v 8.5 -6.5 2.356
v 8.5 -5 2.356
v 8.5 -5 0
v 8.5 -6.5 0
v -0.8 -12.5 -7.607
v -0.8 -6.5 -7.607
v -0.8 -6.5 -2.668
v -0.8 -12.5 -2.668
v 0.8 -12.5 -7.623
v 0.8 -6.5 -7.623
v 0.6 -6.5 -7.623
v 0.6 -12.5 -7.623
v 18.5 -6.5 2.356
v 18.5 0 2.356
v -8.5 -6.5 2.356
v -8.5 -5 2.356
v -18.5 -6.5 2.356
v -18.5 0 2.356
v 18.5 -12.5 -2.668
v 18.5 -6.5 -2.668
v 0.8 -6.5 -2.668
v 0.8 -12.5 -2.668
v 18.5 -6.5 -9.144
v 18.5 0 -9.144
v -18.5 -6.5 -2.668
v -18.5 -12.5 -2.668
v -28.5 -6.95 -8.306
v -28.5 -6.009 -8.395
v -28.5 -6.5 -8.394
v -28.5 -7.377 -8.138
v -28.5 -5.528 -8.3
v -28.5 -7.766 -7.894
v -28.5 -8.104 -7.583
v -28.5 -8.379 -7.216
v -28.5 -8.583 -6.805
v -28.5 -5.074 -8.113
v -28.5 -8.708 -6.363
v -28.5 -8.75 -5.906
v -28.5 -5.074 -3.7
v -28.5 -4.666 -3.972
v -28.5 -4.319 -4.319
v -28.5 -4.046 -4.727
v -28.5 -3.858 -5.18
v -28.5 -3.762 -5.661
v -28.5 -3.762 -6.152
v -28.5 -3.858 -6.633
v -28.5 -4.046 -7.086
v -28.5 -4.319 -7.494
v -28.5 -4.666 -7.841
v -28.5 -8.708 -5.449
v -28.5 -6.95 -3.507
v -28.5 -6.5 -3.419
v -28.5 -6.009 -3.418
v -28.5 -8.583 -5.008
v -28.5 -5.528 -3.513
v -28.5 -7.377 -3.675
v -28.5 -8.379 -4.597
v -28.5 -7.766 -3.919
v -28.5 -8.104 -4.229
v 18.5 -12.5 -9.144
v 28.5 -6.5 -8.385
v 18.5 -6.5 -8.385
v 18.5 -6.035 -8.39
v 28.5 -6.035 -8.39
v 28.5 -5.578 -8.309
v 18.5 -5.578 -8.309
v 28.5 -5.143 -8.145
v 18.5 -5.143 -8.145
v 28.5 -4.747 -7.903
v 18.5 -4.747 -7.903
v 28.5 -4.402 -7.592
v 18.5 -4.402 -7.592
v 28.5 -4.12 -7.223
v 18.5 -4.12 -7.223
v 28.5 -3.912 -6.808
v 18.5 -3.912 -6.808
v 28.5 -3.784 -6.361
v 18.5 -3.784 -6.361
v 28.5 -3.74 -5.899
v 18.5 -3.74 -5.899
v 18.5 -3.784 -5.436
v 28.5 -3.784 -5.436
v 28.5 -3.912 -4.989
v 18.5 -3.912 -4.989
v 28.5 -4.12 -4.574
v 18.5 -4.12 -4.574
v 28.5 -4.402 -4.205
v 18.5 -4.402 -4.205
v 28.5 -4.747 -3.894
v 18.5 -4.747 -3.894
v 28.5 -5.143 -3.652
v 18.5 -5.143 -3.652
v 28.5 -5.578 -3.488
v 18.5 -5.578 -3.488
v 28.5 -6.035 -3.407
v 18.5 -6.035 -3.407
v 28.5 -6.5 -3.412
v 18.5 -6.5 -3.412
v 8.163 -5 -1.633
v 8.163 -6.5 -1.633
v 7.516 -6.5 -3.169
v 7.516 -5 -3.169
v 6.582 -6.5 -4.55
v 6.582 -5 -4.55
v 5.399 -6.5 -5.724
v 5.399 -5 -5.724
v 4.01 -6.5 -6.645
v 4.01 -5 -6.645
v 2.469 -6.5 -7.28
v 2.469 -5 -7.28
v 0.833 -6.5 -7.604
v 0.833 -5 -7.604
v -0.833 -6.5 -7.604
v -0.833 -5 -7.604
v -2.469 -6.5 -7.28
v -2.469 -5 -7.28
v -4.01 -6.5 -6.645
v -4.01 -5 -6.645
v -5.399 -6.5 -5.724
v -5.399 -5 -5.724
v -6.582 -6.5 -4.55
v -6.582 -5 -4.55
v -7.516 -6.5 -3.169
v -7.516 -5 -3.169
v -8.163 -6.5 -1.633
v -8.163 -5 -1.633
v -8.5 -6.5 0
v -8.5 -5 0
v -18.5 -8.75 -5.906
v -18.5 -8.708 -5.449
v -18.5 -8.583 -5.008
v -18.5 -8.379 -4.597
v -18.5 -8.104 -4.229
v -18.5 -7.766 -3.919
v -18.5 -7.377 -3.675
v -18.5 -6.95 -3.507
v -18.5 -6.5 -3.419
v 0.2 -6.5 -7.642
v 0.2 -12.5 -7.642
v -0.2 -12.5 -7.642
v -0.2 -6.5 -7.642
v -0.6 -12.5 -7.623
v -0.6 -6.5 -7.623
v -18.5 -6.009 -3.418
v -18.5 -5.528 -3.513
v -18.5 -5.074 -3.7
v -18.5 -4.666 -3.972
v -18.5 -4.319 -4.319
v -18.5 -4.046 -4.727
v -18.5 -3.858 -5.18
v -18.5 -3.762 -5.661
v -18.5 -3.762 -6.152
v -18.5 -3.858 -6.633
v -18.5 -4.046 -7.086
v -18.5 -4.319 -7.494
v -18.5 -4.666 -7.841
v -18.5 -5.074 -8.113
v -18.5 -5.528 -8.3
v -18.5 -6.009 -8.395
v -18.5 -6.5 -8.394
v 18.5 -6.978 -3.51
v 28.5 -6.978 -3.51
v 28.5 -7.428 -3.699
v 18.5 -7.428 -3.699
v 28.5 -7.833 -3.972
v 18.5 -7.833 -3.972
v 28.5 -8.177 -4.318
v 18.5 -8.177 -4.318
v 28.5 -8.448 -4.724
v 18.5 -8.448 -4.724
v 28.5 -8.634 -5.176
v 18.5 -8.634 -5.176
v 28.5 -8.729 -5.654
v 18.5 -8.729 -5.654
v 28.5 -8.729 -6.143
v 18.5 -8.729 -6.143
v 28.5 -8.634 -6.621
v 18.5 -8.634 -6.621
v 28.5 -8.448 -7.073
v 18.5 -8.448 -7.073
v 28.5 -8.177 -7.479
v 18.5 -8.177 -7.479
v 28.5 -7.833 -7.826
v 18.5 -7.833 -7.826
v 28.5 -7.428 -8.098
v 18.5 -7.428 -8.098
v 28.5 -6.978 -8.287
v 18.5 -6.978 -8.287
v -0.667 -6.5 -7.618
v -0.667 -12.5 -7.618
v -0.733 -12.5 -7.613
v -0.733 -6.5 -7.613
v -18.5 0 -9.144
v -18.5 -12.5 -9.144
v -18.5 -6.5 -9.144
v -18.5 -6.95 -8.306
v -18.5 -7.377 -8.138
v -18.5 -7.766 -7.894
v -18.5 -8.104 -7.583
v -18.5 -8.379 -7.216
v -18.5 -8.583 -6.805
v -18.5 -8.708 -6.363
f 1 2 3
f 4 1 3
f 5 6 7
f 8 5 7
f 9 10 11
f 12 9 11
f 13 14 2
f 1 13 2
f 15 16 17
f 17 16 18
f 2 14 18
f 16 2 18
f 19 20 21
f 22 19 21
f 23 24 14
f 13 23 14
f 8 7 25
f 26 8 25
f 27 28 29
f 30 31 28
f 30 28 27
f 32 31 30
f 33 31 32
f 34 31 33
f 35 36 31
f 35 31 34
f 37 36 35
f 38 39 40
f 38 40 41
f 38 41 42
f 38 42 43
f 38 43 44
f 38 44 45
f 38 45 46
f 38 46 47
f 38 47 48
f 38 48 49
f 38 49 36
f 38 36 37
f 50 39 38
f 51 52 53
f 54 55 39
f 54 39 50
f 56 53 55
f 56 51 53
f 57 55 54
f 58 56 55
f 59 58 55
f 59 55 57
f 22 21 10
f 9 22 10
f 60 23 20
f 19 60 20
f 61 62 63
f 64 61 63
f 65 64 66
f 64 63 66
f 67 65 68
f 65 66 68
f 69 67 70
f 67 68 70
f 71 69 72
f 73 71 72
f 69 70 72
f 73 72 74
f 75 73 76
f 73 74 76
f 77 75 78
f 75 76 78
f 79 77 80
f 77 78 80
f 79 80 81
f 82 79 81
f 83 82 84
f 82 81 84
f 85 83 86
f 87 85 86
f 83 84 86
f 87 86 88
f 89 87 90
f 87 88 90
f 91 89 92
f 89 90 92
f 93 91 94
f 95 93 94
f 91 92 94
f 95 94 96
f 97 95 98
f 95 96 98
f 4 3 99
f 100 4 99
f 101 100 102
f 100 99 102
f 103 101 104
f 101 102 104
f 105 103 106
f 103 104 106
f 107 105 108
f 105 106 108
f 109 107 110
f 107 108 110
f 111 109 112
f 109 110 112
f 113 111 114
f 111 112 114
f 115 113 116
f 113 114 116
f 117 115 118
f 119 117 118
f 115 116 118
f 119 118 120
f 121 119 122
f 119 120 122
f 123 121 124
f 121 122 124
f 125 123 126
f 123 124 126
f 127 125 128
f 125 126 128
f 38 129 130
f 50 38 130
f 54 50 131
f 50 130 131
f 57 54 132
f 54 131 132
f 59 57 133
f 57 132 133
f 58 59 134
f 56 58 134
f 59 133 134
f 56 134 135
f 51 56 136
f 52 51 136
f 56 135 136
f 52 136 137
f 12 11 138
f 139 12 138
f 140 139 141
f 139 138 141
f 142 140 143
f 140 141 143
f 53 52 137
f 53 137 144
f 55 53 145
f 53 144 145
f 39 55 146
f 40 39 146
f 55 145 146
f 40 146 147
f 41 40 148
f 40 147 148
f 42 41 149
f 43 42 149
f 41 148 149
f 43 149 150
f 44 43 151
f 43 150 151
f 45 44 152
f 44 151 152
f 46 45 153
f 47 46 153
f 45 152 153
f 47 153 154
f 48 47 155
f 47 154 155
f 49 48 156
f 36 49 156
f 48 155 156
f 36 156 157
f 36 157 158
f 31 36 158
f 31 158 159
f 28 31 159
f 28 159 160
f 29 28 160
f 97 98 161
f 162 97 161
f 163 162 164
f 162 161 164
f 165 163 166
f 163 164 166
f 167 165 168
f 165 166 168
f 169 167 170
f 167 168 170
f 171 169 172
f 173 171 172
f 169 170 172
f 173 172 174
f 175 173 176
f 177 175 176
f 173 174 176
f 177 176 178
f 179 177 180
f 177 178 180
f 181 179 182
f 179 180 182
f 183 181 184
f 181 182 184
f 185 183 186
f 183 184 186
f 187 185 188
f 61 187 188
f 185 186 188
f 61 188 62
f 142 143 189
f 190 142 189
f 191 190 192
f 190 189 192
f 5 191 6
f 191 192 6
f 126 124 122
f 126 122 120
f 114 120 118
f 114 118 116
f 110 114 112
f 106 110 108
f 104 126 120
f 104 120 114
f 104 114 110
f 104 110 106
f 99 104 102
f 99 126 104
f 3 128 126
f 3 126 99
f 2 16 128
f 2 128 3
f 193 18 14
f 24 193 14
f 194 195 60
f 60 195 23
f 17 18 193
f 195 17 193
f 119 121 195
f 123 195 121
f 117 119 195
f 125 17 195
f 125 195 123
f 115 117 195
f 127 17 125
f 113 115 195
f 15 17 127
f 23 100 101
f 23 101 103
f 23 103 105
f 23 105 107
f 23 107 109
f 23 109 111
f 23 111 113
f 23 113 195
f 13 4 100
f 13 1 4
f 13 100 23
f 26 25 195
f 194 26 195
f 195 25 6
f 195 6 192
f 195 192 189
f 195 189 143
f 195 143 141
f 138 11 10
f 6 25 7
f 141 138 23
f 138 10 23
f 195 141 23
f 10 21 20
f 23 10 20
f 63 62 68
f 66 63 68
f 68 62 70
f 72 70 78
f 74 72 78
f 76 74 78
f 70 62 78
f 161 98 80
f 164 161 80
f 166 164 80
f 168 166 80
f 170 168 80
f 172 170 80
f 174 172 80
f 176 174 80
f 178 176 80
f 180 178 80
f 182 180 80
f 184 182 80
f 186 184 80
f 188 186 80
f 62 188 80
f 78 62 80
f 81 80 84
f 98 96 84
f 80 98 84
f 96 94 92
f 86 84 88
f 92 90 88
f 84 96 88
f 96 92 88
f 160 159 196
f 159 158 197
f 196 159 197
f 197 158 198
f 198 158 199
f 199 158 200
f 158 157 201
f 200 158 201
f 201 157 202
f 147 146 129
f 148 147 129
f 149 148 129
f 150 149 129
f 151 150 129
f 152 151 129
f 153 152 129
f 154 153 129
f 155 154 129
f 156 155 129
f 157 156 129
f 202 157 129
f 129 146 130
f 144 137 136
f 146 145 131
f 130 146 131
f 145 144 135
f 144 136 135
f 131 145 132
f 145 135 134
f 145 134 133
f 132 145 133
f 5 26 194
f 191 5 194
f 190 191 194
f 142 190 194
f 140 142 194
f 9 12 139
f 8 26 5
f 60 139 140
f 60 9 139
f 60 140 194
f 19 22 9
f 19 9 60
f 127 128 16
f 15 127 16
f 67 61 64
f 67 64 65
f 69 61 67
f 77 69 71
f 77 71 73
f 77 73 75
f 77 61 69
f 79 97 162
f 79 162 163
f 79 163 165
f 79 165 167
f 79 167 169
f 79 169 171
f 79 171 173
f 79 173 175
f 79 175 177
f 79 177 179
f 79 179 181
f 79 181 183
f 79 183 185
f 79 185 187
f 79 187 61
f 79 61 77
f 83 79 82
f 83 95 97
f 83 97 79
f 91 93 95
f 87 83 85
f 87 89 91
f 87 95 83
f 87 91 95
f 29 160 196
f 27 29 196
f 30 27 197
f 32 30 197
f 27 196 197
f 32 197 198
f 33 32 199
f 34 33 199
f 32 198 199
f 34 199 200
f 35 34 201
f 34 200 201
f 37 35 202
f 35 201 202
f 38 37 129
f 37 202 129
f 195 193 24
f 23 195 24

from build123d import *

# Parameters (mm, degrees)
F1_DEPTH = 5
F2_DEPTH = 6.5
F4_DEPTH = 6
F6_DEPTH = 10
F8_DEPTH = 10


with BuildPart() as f1:
    # F0 (on Front) → F1 (new body)
    with BuildSketch(Plane.XZ):
        with BuildLine():
            Line((-8.5, 2.3556), (-8.5, 0))
            ThreePointArc((-8.5, 0), (0, -7.6444), (8.5, 0))
            Line((8.5, 0), (8.5, 2.3556))
            Line((8.5, 2.3556), (-8.5, 2.3556))
        make_face()
    extrude(amount=F1_DEPTH)

    # F0 (on Front) → F2 (join)
    with BuildSketch(Plane.XZ):
        with BuildLine():
            ThreePointArc((8.5, 0), (0, -7.6444), (-8.5, 0))
            Line((-8.5, 0), (-8.5, 2.3556))
            Line((-8.5, 2.3556), (-18.5, 2.3556))
            Line((-18.5, 2.3556), (-18.5, -9.1444))
            Line((-18.5, -9.1444), (18.5, -9.1444))
            Line((18.5, -9.1444), (18.5, 2.3556))
            Line((18.5, 2.3556), (8.5, 2.3556))
            Line((8.5, 2.3556), (8.5, 0))
        make_face()
    extrude(amount=F2_DEPTH)


with BuildPart() as f4:
    # F3 (on face) → F4 (new body)
    with BuildSketch(Plane.XZ.offset(6.5)):
        with BuildLine():
            Line((-7.765819, -2.6684), (-18.5, -2.6684))
            Line((-18.5, -2.6684), (-18.5, -9.1444))
            Line((-18.5, -9.1444), (18.5, -9.1444))
            Line((18.5, -9.1444), (18.5, -2.6684))
            Line((18.5, -2.6684), (7.765819, -2.6684))
            ThreePointArc((7.765819, -2.6684), (4.94373, -6.06974), (0.8, -7.606881))
            Line((0.8, -7.606881), (0.8, -7.623304))
            Line((0.8, -7.623304), (0.600173, -7.623304))
            ThreePointArc((0.600173, -7.623304), (0, -7.6444), (-0.600173, -7.623304))
            ThreePointArc((-0.600173, -7.623304), (-0.700135, -7.615679), (-0.8, -7.606881))
            ThreePointArc((-0.8, -7.606881), (-4.94373, -6.06974), (-7.765819, -2.6684))
        make_face()
        with BuildLine():
            Line((-0.8, -2.6684), (-7.765819, -2.6684))
            ThreePointArc((-7.765819, -2.6684), (-4.94373, -6.06974), (-0.8, -7.606881))
            Line((-0.8, -7.606881), (-0.8, -2.6684))
        make_face()
        with BuildLine():
            ThreePointArc((0.8, -7.606881), (4.94373, -6.06974), (7.765819, -2.6684))
            Line((7.765819, -2.6684), (0.8, -2.6684))
            Line((0.8, -2.6684), (0.8, -7.606881))
        make_face()
    extrude(amount=F4_DEPTH)


with BuildPart() as f6:
    # F5 (on face) → F6 (new body)
    with BuildSketch(Plane.YZ.offset(18.5)):
        with BuildLine():
            Line((-6.5, -8.385049), (-6.5, -3.412058))
            ThreePointArc((-6.5, -3.412058), (-8.7405, -5.898553), (-6.5, -8.385049))
        make_face()
        with BuildLine():
            ThreePointArc((-6.5, -8.385049), (-4.566993, -7.755803), (-3.7405, -5.898553))
            ThreePointArc((-3.7405, -5.898553), (-4.566993, -4.041304), (-6.5, -3.412058))
            Line((-6.5, -3.412058), (-6.5, -8.385049))
        make_face()
    extrude(amount=F6_DEPTH)


with BuildPart() as f8:
    # F7 (on face) → F8 (new body)
    with BuildSketch(Plane(origin=(-18.5, 0, 0), x_dir=(0, -1, 0), z_dir=(-1, 0, 0))):
        with BuildLine():
            Line((6.5, -8.393869), (6.5, -3.418931))
            ThreePointArc((6.5, -3.418931), (3.75, -5.9064), (6.5, -8.393869))
        make_face()
        with BuildLine():
            ThreePointArc((6.5, -8.393869), (8.10405, -7.583451), (8.75, -5.9064))
            ThreePointArc((8.75, -5.9064), (8.10405, -4.229349), (6.5, -3.418931))
            Line((6.5, -3.418931), (6.5, -8.393869))
        make_face()
    extrude(amount=F8_DEPTH)


solid = Compound([f1.part, f4.part, f6.part, f8.part])
